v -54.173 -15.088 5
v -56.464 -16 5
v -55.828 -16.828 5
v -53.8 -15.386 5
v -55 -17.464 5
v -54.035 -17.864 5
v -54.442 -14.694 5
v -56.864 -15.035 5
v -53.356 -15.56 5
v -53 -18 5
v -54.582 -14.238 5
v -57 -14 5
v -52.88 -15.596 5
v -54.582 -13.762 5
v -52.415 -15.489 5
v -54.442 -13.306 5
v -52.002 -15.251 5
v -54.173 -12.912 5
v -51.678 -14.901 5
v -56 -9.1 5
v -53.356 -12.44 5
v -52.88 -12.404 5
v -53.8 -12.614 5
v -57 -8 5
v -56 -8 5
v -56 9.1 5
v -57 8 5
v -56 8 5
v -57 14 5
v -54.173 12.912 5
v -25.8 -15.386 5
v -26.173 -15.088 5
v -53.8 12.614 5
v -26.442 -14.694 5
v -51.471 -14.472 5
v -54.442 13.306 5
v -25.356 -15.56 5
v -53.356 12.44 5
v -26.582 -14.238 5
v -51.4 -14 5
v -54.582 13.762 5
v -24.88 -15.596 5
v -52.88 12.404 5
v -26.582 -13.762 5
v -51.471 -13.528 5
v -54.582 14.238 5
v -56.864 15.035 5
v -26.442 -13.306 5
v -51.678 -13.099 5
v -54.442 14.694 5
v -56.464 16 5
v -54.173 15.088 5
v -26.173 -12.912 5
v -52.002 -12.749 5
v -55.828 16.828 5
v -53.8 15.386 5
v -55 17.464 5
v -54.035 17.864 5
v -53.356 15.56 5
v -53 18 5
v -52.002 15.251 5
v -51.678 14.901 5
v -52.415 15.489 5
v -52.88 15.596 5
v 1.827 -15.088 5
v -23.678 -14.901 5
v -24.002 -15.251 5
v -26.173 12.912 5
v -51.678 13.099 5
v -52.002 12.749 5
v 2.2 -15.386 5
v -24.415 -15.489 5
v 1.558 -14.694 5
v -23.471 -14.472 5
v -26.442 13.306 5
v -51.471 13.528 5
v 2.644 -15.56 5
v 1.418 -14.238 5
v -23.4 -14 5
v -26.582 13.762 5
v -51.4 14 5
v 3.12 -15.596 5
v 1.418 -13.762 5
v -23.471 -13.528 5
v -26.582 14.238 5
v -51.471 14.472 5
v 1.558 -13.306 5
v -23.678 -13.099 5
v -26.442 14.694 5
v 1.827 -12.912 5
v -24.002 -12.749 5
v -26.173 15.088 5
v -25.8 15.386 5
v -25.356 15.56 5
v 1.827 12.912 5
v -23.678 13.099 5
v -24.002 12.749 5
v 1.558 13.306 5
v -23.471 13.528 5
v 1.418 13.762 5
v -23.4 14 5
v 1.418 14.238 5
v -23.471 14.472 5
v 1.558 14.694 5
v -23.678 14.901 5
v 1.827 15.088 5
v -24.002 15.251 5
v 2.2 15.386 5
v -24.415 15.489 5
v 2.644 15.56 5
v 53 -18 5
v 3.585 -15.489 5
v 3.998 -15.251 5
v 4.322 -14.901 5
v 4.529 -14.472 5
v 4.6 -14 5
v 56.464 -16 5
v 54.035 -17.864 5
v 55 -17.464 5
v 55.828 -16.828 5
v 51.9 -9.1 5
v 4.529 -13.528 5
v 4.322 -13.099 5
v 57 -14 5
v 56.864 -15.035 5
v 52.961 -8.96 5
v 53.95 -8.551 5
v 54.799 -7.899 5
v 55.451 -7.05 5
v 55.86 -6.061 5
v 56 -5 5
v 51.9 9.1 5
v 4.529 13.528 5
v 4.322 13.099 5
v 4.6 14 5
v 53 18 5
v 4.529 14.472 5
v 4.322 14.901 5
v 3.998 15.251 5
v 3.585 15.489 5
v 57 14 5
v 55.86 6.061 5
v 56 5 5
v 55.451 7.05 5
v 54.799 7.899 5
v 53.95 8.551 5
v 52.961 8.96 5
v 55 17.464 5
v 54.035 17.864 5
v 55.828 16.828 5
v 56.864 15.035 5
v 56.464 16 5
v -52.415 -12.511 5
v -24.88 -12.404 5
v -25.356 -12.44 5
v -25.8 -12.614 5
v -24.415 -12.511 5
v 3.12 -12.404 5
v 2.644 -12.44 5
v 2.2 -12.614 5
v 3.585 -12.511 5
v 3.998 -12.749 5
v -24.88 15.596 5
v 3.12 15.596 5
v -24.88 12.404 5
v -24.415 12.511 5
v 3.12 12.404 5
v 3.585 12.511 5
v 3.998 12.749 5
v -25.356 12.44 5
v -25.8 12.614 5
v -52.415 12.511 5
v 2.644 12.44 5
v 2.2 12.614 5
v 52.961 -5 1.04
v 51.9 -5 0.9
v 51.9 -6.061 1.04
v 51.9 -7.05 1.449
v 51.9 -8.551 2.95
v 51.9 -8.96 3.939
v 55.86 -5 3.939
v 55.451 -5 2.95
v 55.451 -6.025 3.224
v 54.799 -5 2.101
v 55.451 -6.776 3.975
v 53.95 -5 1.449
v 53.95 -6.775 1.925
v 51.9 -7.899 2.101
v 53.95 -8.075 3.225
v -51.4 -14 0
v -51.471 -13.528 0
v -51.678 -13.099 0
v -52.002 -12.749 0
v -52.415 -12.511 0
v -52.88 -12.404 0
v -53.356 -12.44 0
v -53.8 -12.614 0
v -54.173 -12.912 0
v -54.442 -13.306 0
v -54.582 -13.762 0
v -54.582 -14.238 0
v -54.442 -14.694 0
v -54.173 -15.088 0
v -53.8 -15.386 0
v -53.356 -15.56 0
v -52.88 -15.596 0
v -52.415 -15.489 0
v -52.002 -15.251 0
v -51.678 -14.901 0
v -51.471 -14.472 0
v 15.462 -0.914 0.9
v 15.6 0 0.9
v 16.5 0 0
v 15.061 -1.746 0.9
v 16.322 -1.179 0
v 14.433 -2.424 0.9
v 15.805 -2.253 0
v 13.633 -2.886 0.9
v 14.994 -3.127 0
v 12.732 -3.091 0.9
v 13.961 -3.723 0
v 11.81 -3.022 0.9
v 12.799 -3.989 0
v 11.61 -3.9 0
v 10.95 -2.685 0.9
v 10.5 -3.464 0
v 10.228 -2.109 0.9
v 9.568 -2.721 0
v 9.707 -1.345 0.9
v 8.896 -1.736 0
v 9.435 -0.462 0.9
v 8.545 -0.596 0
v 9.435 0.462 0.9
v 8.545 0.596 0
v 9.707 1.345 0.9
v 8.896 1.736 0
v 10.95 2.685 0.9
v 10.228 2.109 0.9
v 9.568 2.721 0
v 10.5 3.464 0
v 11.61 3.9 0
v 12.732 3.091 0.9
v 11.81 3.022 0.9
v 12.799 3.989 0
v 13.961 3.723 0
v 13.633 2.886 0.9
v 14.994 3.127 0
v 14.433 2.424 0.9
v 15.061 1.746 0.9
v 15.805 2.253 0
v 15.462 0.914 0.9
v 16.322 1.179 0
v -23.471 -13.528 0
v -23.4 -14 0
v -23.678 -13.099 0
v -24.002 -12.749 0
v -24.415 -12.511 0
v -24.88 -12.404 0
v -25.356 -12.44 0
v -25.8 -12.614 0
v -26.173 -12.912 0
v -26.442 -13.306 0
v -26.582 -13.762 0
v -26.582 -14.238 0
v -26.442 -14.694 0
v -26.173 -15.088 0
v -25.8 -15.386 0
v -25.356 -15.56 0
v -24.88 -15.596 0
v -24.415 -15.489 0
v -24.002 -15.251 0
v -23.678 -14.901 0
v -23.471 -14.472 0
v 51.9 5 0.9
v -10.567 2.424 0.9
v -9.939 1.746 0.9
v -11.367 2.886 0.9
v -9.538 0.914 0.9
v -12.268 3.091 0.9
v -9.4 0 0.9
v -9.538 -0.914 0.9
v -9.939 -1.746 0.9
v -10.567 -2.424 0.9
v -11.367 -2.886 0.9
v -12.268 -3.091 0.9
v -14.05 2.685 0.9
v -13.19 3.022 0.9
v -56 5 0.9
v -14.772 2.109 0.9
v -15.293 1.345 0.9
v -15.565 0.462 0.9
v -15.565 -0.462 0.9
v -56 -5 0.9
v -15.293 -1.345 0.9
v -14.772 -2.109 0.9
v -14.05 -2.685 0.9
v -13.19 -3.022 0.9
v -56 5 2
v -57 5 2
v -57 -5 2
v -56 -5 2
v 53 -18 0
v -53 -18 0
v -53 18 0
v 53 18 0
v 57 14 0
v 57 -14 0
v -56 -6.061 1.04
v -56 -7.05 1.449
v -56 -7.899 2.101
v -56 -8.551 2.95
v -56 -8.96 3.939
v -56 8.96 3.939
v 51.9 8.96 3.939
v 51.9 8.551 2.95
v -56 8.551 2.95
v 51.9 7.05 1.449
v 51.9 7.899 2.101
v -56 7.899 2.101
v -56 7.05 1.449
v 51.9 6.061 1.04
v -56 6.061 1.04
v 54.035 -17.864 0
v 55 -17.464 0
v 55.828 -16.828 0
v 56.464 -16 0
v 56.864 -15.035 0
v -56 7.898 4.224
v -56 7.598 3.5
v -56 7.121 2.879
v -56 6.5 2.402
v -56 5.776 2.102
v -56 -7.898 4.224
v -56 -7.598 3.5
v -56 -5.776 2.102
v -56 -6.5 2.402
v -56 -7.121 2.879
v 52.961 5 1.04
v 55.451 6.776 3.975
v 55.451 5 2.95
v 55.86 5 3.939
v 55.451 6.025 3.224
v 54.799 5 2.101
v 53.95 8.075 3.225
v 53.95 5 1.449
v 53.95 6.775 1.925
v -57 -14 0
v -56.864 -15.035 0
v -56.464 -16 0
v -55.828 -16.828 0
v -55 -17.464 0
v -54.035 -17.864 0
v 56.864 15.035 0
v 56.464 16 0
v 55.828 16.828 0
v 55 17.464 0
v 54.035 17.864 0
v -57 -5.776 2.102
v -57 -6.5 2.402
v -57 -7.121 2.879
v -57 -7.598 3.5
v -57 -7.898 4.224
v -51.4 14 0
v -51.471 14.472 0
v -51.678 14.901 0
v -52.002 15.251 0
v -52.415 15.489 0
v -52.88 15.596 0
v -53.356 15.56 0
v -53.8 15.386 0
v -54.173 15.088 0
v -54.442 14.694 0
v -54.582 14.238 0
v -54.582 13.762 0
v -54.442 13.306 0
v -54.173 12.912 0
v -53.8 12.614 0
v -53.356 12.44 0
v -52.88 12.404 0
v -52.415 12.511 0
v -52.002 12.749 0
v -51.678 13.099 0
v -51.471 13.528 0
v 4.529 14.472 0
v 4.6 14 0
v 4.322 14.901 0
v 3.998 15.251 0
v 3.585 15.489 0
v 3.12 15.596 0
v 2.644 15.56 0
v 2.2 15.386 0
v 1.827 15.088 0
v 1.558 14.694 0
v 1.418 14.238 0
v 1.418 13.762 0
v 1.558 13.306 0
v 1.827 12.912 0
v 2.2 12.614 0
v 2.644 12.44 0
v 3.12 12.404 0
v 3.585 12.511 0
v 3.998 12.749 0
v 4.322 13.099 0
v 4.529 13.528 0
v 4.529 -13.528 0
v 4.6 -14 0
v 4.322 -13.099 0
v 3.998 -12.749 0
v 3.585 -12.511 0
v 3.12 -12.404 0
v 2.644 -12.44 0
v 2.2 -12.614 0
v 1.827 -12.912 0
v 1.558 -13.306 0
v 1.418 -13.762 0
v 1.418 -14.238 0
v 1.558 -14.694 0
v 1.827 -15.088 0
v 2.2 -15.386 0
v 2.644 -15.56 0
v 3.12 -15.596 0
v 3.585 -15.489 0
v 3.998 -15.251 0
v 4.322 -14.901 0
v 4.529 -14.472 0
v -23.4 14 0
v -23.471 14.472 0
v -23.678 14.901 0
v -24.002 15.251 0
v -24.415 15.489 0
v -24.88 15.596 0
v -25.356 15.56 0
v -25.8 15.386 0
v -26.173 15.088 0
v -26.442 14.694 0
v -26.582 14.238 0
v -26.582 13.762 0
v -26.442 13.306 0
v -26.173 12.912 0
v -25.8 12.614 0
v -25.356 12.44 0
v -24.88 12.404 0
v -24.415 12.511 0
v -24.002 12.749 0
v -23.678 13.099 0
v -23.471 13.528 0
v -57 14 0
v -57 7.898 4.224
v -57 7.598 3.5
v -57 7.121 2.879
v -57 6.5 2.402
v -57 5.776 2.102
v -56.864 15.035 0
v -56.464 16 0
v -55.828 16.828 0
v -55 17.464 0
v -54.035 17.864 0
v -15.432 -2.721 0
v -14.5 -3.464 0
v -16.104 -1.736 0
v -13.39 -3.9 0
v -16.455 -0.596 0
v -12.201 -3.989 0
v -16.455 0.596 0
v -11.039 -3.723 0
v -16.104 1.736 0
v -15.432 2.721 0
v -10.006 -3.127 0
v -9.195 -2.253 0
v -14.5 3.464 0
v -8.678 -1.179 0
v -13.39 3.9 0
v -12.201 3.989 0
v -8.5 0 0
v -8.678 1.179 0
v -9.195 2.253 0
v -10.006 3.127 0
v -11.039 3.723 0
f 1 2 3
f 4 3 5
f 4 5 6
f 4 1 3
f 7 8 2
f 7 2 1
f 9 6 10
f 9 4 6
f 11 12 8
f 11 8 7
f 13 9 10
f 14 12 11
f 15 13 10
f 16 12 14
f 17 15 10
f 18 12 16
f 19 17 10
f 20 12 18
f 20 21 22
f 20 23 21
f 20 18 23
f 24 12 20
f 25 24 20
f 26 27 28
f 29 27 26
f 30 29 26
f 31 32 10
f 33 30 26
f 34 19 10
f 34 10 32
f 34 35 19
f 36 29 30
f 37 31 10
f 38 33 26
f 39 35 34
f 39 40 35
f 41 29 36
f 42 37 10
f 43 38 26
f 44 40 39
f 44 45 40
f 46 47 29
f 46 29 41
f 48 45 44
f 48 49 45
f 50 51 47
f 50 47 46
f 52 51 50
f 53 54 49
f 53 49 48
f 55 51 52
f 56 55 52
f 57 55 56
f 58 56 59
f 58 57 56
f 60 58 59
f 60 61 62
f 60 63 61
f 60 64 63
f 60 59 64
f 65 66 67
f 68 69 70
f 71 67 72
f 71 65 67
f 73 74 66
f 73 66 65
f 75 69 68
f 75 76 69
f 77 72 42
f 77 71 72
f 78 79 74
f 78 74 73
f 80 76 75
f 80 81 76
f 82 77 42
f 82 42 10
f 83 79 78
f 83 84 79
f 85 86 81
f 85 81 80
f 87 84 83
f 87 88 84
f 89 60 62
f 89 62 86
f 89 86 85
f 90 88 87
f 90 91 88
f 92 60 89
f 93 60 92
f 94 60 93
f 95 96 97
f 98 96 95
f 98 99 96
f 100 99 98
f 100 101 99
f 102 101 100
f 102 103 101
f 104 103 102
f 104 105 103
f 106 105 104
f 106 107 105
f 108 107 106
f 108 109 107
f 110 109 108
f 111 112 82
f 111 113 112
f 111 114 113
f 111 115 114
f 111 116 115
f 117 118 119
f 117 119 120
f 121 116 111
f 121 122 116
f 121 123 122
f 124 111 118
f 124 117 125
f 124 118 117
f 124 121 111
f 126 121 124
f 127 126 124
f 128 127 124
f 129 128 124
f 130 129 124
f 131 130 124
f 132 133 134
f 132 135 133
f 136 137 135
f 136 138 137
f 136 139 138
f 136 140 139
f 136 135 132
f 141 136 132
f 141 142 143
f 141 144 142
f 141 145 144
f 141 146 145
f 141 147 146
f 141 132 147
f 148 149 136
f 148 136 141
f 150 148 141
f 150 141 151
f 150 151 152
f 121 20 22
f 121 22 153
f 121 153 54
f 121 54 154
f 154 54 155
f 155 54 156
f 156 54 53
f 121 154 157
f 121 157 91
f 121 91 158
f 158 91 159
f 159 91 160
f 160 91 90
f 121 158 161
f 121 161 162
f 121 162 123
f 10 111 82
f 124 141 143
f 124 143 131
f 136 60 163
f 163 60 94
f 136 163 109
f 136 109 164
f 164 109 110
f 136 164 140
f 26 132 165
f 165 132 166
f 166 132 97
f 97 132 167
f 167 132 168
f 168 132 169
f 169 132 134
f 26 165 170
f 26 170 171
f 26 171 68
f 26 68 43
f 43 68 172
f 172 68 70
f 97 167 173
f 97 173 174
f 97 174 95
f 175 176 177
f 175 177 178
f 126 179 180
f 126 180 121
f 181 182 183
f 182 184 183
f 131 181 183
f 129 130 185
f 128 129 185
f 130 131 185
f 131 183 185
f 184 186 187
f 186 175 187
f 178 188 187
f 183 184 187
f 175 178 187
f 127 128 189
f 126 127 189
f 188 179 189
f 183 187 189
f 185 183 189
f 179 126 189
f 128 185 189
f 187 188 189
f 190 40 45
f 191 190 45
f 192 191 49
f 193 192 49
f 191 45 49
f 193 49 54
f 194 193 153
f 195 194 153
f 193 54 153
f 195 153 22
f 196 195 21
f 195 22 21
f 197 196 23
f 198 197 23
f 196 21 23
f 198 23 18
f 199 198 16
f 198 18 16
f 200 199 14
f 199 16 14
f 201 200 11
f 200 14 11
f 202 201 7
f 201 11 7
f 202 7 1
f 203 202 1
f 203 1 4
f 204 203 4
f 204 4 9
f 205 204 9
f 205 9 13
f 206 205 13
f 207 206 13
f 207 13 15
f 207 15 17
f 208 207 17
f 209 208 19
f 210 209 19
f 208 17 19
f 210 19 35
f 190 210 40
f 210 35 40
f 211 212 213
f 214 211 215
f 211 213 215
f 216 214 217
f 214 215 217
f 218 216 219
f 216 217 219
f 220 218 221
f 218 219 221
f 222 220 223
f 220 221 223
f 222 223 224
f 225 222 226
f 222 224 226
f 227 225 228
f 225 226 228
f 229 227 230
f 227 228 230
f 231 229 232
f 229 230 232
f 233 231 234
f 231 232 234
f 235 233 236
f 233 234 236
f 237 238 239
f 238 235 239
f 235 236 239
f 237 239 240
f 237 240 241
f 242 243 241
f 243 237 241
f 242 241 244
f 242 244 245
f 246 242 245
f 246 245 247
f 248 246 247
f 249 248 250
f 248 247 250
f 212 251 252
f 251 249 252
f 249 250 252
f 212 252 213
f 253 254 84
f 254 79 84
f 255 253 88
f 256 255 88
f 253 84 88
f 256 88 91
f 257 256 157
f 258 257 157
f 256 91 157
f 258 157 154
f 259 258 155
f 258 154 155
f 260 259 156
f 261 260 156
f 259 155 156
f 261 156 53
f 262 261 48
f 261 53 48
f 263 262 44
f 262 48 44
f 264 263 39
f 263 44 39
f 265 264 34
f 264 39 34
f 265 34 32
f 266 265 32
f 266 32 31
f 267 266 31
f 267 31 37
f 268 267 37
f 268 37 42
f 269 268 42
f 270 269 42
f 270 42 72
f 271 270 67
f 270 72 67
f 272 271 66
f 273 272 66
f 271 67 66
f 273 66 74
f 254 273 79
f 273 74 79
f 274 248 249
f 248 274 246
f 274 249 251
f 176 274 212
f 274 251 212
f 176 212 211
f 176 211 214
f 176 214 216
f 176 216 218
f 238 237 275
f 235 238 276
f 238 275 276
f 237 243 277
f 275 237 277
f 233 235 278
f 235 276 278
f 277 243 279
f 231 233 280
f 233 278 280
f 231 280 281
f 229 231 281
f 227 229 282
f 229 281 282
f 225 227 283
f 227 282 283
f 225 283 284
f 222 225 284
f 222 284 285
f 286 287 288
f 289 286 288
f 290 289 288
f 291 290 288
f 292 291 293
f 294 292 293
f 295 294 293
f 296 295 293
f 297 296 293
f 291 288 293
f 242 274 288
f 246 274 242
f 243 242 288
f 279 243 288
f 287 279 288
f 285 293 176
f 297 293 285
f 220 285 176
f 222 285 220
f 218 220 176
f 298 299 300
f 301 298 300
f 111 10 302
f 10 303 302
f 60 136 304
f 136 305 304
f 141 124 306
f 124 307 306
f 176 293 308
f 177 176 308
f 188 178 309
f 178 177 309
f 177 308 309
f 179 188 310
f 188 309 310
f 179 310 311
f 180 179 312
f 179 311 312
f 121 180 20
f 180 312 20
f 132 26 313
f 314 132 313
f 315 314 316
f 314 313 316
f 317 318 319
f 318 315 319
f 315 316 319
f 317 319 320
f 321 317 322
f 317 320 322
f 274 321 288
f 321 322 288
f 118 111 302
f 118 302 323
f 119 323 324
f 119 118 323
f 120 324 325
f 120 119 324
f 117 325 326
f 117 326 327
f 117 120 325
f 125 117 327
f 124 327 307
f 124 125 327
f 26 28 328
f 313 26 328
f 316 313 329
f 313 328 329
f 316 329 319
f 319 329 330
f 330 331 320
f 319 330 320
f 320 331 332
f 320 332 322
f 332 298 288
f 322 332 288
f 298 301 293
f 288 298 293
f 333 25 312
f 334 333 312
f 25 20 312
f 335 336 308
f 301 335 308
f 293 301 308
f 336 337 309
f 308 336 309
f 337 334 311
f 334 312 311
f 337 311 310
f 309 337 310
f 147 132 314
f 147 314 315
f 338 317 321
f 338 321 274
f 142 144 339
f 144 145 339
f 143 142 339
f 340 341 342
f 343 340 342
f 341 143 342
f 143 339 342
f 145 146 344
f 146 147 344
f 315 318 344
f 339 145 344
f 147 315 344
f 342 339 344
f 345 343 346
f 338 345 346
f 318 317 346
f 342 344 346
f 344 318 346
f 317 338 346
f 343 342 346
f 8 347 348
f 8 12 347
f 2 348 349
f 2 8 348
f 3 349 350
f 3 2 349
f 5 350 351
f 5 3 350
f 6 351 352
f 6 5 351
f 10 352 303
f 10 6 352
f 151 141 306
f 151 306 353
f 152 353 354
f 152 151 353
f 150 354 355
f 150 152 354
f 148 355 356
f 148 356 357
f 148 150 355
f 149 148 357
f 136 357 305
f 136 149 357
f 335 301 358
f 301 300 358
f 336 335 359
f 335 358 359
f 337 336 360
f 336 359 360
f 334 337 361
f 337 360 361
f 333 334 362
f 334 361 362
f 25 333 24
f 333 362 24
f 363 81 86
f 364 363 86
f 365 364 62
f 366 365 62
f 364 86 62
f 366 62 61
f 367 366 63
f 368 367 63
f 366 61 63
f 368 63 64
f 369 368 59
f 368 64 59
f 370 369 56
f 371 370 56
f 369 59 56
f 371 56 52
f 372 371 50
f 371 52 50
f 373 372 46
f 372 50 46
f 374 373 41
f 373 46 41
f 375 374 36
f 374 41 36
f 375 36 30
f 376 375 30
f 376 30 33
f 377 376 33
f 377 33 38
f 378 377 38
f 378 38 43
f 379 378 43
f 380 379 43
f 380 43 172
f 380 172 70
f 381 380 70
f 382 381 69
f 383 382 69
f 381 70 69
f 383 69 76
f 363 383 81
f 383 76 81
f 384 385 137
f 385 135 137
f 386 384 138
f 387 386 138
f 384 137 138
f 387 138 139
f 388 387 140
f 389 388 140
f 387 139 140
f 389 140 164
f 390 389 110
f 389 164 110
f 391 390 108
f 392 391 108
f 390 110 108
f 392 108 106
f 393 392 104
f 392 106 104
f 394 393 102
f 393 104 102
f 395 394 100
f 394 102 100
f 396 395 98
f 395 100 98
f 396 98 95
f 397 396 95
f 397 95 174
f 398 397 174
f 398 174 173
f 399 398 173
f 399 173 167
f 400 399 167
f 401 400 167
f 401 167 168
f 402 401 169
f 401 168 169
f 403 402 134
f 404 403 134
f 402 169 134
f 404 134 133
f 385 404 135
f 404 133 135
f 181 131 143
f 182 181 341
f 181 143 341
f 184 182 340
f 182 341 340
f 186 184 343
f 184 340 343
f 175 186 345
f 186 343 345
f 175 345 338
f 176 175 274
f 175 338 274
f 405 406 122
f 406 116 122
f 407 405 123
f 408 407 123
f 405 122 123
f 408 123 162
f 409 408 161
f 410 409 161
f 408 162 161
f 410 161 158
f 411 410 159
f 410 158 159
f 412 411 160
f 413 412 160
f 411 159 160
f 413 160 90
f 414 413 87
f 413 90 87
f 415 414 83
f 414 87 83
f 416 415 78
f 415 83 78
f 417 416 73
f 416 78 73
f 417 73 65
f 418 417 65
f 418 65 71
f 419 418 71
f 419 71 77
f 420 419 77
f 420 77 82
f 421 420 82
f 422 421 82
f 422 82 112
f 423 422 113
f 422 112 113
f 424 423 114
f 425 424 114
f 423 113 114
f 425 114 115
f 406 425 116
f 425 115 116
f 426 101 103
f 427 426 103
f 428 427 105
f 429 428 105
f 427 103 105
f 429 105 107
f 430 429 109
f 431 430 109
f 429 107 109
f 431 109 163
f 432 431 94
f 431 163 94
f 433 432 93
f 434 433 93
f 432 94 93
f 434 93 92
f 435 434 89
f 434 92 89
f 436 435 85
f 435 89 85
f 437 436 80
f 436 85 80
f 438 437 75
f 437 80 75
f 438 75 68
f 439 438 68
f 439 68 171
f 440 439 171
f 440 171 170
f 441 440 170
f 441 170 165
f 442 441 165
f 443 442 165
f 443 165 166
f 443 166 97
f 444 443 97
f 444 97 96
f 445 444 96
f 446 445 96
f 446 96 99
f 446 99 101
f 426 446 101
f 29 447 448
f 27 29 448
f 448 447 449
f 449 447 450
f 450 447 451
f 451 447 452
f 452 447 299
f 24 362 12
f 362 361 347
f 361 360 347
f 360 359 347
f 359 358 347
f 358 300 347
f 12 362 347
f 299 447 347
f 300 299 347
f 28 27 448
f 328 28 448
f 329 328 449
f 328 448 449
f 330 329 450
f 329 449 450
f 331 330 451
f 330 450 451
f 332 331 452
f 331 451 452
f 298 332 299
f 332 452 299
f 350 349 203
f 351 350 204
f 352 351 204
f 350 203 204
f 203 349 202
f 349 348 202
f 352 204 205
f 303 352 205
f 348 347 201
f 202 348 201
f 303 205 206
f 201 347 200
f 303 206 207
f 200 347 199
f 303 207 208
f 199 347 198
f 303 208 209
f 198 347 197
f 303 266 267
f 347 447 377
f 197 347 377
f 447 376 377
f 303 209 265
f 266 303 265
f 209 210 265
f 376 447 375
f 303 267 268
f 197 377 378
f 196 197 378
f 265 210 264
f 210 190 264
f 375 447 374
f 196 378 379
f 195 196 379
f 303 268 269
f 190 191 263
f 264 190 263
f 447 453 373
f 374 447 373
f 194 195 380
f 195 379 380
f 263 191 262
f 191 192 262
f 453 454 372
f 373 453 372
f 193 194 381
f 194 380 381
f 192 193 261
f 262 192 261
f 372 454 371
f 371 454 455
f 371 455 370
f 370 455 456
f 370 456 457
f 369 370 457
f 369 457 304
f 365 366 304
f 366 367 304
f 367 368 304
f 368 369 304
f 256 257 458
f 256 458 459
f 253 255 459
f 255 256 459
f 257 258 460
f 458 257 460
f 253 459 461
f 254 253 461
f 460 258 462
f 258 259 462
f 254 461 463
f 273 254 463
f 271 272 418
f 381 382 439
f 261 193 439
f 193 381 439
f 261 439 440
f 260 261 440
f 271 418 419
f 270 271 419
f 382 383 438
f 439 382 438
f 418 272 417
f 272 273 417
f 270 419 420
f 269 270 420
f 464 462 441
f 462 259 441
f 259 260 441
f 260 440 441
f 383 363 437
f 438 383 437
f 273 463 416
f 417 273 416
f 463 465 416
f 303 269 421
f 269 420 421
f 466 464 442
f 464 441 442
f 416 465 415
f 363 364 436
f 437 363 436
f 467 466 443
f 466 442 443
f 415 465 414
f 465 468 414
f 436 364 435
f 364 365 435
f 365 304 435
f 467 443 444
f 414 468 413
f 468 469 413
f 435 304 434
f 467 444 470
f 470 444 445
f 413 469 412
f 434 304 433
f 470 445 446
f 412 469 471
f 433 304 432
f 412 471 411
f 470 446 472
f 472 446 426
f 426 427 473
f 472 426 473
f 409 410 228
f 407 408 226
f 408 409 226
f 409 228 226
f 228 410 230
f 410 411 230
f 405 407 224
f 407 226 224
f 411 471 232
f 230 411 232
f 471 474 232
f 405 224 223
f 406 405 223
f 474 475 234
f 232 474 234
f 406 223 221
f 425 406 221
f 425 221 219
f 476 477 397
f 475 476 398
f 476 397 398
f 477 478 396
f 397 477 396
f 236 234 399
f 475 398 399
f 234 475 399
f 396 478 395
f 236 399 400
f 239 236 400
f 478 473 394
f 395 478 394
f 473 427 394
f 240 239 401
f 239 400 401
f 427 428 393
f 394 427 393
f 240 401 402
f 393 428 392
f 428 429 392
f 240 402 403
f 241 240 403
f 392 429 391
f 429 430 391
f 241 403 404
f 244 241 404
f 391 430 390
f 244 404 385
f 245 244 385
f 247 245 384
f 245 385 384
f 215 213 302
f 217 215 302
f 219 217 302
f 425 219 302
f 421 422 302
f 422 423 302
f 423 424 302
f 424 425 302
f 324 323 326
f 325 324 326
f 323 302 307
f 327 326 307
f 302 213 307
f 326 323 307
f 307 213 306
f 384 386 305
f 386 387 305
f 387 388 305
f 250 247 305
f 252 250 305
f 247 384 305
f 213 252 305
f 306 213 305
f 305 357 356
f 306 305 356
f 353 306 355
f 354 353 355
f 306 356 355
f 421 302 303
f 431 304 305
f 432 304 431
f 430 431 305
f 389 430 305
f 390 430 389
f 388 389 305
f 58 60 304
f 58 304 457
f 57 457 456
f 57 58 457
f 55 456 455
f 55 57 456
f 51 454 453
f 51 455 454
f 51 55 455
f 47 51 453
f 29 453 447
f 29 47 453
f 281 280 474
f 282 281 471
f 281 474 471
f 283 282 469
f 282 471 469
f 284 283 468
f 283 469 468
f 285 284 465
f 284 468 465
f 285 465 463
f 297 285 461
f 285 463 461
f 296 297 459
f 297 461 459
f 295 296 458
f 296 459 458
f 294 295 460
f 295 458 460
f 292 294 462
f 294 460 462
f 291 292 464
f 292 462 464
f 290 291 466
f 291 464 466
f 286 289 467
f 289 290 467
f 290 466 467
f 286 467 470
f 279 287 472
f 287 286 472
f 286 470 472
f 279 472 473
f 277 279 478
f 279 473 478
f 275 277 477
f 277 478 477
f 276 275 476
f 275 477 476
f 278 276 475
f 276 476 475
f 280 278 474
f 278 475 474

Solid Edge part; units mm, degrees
sketch "Sketch1" plane through (0, 0, 0) normal (0, 0, 1) x (1, 0, 0)
  line L0 (57, -18) -> (57, 18)
  line L1 (57, 18) -> (-57, 18)
  line L2 (-57, 18) -> (-57, -18)
  line L3 (-57, -18) -> (57, -18)
extrude "Protrusion1" add sketch "Sketch1" along normal blind 5
sketch "Sketch2" plane through (-57, 0, 2.5) normal (-1, 0, 0) x (0, -1, 0)
  line L0 (-5, -0.5) -> (5, -0.5)
  line L1 (-8, 2.5) -> (8, 2.5)
  arc A0 (8, 2.5) -> (5, -0.5) centre (5, 2.5) cw
  arc A1 (-5, -0.5) -> (-8, 2.5) centre (-5, 2.5) cw
extrude "VaciadoExtruido_2" cut sketch "Sketch2" against normal blind 1
sketch "Sketch3" plane through (-56, 0, 2.5) normal (-1, 0, 0) x (0, -1, 0)
  line L0 (-5, -1.6) -> (5, -1.6)
  line L1 (-9.1, 2.5) -> (9.1, 2.5)
  arc A0 (9.1, 2.5) -> (5, -1.6) centre (5, 2.5) cw
  arc A1 (-5, -1.6) -> (-9.1, 2.5) centre (-5, 2.5) cw
extrude "VaciadoExtruido_3" cut sketch "Sketch3" against normal blind 112
fillet "Redondeo_3" radius 4.1 3 edges at (56, 7.8991, 2.1009) (56, -7.8991, 2.1009) (56, 0, 0.9)
sketch "Sketch4" plane through (0, 0, 5) normal (0, 0, 1) x (1, 0, 0)
  circle A0 centre (-53, 14) radius 1.6
extrude "Cutout1" cut sketch "Sketch4" against normal through all
pattern_linear "Pattern1" count 3 spacing 28 along (1, 0, 0) count 2 spacing 28 along (0, -1, 0) of "Cutout1"
fillet "Redondeo_4" radius 4 4 edges at (-57, 18, 2.5) (-57, -18, 2.5) (57, 18, 2.5) (57, -18, 2.5)
sketch "Sketch5" plane through (0, 0, 0) normal (0, 0, -1) x (1, 0, 0)
  circle A0 centre (12.5, 0) radius 3
  circle A1 centre (-12.5, 0) radius 3
  dimension "D1" = 25
  dimension "D2" = 12.5
extrude "Cutout2" cut sketch "Sketch5" against normal through all
chamfer "Chaflán_1" distance 1 angle 45 2 edges at (-15.5, 0, 0) (9.5, 0, 0)
